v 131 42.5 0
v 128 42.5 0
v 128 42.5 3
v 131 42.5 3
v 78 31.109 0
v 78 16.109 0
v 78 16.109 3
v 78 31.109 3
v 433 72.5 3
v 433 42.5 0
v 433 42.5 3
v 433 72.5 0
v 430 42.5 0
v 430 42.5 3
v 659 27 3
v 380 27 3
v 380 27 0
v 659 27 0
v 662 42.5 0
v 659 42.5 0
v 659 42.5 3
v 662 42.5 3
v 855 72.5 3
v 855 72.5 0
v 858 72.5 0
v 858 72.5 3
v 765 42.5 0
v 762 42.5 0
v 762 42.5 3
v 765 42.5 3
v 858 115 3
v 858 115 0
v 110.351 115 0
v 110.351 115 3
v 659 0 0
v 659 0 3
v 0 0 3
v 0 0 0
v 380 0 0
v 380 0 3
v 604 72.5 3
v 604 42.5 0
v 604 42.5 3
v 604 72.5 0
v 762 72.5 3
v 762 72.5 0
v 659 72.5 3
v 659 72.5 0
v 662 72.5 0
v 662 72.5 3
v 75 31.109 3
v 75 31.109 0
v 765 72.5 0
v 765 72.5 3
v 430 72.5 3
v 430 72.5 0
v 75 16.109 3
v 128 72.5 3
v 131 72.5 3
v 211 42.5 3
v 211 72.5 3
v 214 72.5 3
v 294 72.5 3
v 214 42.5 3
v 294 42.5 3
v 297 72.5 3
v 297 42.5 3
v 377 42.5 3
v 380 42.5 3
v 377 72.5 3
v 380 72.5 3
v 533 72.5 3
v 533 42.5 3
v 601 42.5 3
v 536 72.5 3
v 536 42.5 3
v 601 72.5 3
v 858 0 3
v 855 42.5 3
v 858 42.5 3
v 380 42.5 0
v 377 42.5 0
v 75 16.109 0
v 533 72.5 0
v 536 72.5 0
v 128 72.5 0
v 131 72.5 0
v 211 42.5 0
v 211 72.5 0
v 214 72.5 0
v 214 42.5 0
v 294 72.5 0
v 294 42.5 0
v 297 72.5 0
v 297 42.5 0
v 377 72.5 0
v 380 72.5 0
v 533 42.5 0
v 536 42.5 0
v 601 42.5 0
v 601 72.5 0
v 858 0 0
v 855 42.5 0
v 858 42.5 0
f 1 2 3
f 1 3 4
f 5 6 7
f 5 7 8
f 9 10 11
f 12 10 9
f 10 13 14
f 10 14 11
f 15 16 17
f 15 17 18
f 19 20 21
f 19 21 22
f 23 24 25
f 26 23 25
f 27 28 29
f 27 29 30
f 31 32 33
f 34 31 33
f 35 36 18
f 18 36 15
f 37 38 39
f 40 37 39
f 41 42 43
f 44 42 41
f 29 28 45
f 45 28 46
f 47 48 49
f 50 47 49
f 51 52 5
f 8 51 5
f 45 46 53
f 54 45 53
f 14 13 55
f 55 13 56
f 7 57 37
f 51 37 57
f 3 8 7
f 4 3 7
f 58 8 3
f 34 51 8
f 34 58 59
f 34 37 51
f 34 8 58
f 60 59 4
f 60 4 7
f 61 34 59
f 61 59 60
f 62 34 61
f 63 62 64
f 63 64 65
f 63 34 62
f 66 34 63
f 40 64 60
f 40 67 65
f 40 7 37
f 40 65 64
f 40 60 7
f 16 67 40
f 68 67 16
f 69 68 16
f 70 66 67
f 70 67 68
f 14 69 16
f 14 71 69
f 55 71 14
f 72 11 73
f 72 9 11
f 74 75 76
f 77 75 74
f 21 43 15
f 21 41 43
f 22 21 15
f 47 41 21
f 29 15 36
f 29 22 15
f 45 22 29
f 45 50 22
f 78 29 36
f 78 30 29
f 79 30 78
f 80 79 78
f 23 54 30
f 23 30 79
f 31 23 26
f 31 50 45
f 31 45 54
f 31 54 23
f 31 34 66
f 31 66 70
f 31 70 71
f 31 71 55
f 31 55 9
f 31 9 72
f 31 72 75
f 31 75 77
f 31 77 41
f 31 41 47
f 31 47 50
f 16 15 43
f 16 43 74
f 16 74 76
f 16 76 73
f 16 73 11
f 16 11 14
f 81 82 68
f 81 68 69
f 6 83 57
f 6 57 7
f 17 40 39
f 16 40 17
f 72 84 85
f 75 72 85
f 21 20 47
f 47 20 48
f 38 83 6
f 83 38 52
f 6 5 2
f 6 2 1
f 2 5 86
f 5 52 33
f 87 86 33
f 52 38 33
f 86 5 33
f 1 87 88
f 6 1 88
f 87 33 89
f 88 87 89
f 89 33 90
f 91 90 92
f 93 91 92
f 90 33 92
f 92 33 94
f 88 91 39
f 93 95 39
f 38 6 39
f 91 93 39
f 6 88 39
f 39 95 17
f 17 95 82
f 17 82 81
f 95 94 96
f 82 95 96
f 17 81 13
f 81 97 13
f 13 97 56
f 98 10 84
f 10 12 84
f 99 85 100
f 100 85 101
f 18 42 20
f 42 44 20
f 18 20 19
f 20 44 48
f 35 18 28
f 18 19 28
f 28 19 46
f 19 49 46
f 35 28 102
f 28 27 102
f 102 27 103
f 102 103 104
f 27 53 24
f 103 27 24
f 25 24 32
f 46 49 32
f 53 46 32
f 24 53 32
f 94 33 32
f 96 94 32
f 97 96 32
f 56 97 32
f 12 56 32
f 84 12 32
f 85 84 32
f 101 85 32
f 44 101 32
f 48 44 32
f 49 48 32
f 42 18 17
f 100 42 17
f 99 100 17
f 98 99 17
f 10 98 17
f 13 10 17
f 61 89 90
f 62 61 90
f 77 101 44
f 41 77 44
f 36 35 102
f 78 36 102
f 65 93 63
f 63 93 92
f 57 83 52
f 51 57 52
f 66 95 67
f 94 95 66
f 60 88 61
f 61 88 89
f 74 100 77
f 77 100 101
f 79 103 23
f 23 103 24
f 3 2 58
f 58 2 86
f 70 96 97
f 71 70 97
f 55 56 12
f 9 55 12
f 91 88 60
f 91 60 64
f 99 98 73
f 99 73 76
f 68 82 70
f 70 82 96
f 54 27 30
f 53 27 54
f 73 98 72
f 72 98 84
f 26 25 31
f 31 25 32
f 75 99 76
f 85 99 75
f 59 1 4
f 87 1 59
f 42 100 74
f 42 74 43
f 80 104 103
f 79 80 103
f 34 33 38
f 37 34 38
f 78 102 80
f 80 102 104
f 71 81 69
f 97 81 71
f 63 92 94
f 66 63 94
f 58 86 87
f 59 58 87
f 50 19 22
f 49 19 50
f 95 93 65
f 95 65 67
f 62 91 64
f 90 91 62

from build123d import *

# Parameters (mm, degrees)
SKETCH1_W           = 3
SKETCH1_H           = 15
SKETCH1_H_2         = 30
BOSS_EXTRUDE1_DEPTH = 3
SKETCH2_W           = 279
SKETCH2_H           = 27
CUT_EXTRUDE1_DEPTH  = 10


with BuildPart() as part:
    # Sketch1 → Boss-Extrude1 (new body)
    with BuildSketch(Plane.XY):
        Polygon((110.35106383, 115), (0, 0), (858, 0), (858, 42.5), (855, 42.5), (855, 72.5), (858, 72.5), (858, 115), align=None)
        with Locations((76.5, 23.609115303)):
            Rectangle(SKETCH1_W, SKETCH1_H, mode=Mode.SUBTRACT)
        with Locations((129.5, 57.5)):
            Rectangle(SKETCH1_W, SKETCH1_H_2, mode=Mode.SUBTRACT)
        with Locations((212.5, 57.5)):
            Rectangle(SKETCH1_W, SKETCH1_H_2, mode=Mode.SUBTRACT)
        with Locations((295.5, 57.5)):
            Rectangle(SKETCH1_W, SKETCH1_H_2, mode=Mode.SUBTRACT)
        with Locations((378.5, 57.5)):
            Rectangle(SKETCH1_W, SKETCH1_H_2, mode=Mode.SUBTRACT)
        with Locations((431.5, 57.5)):
            Rectangle(SKETCH1_W, SKETCH1_H_2, mode=Mode.SUBTRACT)
        with Locations((534.5, 57.5)):
            Rectangle(SKETCH1_W, SKETCH1_H_2, mode=Mode.SUBTRACT)
        with Locations((602.5, 57.5)):
            Rectangle(SKETCH1_W, SKETCH1_H_2, mode=Mode.SUBTRACT)
        with Locations((660.5, 57.5)):
            Rectangle(SKETCH1_W, SKETCH1_H_2, mode=Mode.SUBTRACT)
        with Locations((763.5, 57.5)):
            Rectangle(SKETCH1_W, SKETCH1_H_2, mode=Mode.SUBTRACT)
    extrude(amount=BOSS_EXTRUDE1_DEPTH)

    # Sketch2 → Cut-Extrude1 (cut)
    with BuildSketch(Plane.XY.offset(3)):
        with Locations((519.5, 13.5)):
            Rectangle(SKETCH2_W, SKETCH2_H)
    extrude(amount=-CUT_EXTRUDE1_DEPTH, mode=Mode.SUBTRACT)


solid = part.part
